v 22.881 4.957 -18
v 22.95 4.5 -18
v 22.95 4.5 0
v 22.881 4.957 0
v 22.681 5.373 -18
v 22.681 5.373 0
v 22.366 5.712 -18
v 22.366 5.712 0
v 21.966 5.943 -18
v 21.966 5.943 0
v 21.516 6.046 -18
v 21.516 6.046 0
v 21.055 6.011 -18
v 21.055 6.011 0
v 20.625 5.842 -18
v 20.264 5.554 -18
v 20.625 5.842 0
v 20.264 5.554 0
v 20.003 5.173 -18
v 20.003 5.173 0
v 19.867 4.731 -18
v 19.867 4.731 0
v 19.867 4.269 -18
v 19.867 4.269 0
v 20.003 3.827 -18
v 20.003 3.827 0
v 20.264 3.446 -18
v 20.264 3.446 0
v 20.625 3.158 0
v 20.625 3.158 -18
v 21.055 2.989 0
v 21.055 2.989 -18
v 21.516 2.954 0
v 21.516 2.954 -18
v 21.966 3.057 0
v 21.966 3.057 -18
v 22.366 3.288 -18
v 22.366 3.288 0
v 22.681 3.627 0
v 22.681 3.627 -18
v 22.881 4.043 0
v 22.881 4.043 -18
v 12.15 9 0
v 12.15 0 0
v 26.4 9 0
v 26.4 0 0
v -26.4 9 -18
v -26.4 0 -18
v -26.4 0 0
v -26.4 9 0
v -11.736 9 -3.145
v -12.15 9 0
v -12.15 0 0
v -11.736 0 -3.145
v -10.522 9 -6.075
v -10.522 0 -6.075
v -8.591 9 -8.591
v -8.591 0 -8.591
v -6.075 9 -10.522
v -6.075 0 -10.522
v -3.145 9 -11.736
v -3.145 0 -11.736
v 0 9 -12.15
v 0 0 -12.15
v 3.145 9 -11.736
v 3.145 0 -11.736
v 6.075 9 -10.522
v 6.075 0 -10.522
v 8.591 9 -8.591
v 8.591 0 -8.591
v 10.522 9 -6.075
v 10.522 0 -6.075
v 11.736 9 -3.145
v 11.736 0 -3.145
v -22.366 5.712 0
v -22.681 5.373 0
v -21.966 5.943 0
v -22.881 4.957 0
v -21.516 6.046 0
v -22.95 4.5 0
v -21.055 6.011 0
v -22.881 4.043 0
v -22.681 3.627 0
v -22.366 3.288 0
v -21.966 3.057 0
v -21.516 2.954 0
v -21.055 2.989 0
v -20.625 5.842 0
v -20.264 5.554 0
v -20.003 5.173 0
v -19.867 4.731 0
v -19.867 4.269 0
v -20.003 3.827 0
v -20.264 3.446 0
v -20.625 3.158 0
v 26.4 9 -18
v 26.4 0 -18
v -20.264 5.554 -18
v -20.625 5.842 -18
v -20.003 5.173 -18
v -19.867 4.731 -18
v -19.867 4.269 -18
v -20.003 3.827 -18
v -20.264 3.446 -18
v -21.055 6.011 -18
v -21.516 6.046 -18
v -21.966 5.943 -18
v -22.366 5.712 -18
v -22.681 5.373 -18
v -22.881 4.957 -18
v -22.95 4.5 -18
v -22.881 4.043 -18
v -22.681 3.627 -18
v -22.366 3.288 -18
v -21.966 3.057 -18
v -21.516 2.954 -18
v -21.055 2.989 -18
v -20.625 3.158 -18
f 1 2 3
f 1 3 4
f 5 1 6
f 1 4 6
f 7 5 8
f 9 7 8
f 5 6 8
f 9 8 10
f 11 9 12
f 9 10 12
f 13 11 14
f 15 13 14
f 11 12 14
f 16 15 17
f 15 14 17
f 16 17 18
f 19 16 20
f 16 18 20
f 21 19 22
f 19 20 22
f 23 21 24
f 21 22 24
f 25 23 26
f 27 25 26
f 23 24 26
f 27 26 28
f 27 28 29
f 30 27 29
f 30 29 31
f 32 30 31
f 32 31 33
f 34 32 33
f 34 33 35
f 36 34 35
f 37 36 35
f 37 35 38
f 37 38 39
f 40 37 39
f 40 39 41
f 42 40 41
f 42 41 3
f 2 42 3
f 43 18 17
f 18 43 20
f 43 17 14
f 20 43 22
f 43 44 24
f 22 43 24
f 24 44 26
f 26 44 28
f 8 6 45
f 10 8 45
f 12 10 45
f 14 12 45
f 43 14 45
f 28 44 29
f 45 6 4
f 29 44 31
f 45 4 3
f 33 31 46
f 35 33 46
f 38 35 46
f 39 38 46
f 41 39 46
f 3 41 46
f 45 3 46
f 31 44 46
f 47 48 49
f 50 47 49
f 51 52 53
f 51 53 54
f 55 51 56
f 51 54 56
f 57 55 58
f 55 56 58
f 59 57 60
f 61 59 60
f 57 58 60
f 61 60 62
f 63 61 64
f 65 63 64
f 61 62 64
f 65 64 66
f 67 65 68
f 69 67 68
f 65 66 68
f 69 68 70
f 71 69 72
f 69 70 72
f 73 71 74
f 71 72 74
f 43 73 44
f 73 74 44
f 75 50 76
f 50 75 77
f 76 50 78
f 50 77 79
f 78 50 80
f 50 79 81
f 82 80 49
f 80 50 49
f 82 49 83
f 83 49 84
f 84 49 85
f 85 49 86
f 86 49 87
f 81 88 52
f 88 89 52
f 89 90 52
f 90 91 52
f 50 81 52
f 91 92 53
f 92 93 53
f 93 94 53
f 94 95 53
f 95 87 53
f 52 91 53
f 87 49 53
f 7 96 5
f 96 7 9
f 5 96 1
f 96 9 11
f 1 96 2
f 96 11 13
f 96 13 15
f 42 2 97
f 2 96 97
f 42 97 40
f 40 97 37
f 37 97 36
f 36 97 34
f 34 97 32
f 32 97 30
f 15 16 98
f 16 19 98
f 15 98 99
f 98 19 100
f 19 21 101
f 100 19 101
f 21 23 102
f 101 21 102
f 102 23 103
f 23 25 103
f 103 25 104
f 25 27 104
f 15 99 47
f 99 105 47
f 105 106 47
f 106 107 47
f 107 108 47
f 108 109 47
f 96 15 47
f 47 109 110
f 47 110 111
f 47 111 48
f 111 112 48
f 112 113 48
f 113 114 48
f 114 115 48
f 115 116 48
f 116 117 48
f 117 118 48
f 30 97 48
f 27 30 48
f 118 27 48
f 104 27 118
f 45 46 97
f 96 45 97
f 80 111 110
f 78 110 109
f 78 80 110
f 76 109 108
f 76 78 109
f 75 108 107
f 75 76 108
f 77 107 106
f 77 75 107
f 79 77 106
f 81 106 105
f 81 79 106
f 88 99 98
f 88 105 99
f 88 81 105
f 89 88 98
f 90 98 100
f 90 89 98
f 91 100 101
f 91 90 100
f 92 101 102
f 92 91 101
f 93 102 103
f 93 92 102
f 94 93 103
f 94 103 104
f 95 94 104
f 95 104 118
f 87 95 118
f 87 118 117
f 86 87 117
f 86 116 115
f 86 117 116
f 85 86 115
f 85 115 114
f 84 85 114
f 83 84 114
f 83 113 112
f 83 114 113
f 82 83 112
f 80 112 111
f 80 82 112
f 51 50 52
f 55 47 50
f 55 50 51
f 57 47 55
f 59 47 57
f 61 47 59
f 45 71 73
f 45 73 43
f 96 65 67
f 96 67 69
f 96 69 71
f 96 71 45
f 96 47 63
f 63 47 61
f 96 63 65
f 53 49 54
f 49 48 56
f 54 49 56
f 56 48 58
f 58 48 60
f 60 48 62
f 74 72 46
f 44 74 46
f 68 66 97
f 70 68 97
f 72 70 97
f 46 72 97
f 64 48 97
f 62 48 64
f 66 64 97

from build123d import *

# Parameters (mm, degrees)
BOSS_EXTRUDE1_DEPTH = 9
SKETCH2_R           = 1.55
CUT_EXTRUDE1_DEPTH  = 19


with BuildPart() as part:
    # Sketch1 → Boss-Extrude1 (new body)
    with BuildSketch(Plane(origin=(0, 0, 0), x_dir=(1, 0, 0), z_dir=(0, 1, 0))):
        with BuildLine():
            Line((12.15, 0), (26.4, 0))
            Line((26.4, 0), (26.4, 18))
            Line((26.4, 18), (-26.4, 18))
            Line((-26.4, 18), (-26.4, 0))
            Line((-26.4, 0), (-12.15, 0))
            ThreePointArc((-12.15, 0), (0, 12.15), (12.15, 0))
        make_face()
    extrude(amount=BOSS_EXTRUDE1_DEPTH)

    # Sketch2 → Cut-Extrude1 (cut, through all)
    with BuildSketch(Plane.XY):
        with Locations((21.4, 4.5)):
            Circle(SKETCH2_R)
    cut_extrude1 = extrude(amount=-CUT_EXTRUDE1_DEPTH, mode=Mode.SUBTRACT)

    # Mirror1: Cut-Extrude1 across plane
    add(cut_extrude1.mirror(Plane(origin=(0, 0, 0), x_dir=(0, 0, 1), z_dir=(1, 0, 0))), mode=Mode.SUBTRACT)


solid = part.part
